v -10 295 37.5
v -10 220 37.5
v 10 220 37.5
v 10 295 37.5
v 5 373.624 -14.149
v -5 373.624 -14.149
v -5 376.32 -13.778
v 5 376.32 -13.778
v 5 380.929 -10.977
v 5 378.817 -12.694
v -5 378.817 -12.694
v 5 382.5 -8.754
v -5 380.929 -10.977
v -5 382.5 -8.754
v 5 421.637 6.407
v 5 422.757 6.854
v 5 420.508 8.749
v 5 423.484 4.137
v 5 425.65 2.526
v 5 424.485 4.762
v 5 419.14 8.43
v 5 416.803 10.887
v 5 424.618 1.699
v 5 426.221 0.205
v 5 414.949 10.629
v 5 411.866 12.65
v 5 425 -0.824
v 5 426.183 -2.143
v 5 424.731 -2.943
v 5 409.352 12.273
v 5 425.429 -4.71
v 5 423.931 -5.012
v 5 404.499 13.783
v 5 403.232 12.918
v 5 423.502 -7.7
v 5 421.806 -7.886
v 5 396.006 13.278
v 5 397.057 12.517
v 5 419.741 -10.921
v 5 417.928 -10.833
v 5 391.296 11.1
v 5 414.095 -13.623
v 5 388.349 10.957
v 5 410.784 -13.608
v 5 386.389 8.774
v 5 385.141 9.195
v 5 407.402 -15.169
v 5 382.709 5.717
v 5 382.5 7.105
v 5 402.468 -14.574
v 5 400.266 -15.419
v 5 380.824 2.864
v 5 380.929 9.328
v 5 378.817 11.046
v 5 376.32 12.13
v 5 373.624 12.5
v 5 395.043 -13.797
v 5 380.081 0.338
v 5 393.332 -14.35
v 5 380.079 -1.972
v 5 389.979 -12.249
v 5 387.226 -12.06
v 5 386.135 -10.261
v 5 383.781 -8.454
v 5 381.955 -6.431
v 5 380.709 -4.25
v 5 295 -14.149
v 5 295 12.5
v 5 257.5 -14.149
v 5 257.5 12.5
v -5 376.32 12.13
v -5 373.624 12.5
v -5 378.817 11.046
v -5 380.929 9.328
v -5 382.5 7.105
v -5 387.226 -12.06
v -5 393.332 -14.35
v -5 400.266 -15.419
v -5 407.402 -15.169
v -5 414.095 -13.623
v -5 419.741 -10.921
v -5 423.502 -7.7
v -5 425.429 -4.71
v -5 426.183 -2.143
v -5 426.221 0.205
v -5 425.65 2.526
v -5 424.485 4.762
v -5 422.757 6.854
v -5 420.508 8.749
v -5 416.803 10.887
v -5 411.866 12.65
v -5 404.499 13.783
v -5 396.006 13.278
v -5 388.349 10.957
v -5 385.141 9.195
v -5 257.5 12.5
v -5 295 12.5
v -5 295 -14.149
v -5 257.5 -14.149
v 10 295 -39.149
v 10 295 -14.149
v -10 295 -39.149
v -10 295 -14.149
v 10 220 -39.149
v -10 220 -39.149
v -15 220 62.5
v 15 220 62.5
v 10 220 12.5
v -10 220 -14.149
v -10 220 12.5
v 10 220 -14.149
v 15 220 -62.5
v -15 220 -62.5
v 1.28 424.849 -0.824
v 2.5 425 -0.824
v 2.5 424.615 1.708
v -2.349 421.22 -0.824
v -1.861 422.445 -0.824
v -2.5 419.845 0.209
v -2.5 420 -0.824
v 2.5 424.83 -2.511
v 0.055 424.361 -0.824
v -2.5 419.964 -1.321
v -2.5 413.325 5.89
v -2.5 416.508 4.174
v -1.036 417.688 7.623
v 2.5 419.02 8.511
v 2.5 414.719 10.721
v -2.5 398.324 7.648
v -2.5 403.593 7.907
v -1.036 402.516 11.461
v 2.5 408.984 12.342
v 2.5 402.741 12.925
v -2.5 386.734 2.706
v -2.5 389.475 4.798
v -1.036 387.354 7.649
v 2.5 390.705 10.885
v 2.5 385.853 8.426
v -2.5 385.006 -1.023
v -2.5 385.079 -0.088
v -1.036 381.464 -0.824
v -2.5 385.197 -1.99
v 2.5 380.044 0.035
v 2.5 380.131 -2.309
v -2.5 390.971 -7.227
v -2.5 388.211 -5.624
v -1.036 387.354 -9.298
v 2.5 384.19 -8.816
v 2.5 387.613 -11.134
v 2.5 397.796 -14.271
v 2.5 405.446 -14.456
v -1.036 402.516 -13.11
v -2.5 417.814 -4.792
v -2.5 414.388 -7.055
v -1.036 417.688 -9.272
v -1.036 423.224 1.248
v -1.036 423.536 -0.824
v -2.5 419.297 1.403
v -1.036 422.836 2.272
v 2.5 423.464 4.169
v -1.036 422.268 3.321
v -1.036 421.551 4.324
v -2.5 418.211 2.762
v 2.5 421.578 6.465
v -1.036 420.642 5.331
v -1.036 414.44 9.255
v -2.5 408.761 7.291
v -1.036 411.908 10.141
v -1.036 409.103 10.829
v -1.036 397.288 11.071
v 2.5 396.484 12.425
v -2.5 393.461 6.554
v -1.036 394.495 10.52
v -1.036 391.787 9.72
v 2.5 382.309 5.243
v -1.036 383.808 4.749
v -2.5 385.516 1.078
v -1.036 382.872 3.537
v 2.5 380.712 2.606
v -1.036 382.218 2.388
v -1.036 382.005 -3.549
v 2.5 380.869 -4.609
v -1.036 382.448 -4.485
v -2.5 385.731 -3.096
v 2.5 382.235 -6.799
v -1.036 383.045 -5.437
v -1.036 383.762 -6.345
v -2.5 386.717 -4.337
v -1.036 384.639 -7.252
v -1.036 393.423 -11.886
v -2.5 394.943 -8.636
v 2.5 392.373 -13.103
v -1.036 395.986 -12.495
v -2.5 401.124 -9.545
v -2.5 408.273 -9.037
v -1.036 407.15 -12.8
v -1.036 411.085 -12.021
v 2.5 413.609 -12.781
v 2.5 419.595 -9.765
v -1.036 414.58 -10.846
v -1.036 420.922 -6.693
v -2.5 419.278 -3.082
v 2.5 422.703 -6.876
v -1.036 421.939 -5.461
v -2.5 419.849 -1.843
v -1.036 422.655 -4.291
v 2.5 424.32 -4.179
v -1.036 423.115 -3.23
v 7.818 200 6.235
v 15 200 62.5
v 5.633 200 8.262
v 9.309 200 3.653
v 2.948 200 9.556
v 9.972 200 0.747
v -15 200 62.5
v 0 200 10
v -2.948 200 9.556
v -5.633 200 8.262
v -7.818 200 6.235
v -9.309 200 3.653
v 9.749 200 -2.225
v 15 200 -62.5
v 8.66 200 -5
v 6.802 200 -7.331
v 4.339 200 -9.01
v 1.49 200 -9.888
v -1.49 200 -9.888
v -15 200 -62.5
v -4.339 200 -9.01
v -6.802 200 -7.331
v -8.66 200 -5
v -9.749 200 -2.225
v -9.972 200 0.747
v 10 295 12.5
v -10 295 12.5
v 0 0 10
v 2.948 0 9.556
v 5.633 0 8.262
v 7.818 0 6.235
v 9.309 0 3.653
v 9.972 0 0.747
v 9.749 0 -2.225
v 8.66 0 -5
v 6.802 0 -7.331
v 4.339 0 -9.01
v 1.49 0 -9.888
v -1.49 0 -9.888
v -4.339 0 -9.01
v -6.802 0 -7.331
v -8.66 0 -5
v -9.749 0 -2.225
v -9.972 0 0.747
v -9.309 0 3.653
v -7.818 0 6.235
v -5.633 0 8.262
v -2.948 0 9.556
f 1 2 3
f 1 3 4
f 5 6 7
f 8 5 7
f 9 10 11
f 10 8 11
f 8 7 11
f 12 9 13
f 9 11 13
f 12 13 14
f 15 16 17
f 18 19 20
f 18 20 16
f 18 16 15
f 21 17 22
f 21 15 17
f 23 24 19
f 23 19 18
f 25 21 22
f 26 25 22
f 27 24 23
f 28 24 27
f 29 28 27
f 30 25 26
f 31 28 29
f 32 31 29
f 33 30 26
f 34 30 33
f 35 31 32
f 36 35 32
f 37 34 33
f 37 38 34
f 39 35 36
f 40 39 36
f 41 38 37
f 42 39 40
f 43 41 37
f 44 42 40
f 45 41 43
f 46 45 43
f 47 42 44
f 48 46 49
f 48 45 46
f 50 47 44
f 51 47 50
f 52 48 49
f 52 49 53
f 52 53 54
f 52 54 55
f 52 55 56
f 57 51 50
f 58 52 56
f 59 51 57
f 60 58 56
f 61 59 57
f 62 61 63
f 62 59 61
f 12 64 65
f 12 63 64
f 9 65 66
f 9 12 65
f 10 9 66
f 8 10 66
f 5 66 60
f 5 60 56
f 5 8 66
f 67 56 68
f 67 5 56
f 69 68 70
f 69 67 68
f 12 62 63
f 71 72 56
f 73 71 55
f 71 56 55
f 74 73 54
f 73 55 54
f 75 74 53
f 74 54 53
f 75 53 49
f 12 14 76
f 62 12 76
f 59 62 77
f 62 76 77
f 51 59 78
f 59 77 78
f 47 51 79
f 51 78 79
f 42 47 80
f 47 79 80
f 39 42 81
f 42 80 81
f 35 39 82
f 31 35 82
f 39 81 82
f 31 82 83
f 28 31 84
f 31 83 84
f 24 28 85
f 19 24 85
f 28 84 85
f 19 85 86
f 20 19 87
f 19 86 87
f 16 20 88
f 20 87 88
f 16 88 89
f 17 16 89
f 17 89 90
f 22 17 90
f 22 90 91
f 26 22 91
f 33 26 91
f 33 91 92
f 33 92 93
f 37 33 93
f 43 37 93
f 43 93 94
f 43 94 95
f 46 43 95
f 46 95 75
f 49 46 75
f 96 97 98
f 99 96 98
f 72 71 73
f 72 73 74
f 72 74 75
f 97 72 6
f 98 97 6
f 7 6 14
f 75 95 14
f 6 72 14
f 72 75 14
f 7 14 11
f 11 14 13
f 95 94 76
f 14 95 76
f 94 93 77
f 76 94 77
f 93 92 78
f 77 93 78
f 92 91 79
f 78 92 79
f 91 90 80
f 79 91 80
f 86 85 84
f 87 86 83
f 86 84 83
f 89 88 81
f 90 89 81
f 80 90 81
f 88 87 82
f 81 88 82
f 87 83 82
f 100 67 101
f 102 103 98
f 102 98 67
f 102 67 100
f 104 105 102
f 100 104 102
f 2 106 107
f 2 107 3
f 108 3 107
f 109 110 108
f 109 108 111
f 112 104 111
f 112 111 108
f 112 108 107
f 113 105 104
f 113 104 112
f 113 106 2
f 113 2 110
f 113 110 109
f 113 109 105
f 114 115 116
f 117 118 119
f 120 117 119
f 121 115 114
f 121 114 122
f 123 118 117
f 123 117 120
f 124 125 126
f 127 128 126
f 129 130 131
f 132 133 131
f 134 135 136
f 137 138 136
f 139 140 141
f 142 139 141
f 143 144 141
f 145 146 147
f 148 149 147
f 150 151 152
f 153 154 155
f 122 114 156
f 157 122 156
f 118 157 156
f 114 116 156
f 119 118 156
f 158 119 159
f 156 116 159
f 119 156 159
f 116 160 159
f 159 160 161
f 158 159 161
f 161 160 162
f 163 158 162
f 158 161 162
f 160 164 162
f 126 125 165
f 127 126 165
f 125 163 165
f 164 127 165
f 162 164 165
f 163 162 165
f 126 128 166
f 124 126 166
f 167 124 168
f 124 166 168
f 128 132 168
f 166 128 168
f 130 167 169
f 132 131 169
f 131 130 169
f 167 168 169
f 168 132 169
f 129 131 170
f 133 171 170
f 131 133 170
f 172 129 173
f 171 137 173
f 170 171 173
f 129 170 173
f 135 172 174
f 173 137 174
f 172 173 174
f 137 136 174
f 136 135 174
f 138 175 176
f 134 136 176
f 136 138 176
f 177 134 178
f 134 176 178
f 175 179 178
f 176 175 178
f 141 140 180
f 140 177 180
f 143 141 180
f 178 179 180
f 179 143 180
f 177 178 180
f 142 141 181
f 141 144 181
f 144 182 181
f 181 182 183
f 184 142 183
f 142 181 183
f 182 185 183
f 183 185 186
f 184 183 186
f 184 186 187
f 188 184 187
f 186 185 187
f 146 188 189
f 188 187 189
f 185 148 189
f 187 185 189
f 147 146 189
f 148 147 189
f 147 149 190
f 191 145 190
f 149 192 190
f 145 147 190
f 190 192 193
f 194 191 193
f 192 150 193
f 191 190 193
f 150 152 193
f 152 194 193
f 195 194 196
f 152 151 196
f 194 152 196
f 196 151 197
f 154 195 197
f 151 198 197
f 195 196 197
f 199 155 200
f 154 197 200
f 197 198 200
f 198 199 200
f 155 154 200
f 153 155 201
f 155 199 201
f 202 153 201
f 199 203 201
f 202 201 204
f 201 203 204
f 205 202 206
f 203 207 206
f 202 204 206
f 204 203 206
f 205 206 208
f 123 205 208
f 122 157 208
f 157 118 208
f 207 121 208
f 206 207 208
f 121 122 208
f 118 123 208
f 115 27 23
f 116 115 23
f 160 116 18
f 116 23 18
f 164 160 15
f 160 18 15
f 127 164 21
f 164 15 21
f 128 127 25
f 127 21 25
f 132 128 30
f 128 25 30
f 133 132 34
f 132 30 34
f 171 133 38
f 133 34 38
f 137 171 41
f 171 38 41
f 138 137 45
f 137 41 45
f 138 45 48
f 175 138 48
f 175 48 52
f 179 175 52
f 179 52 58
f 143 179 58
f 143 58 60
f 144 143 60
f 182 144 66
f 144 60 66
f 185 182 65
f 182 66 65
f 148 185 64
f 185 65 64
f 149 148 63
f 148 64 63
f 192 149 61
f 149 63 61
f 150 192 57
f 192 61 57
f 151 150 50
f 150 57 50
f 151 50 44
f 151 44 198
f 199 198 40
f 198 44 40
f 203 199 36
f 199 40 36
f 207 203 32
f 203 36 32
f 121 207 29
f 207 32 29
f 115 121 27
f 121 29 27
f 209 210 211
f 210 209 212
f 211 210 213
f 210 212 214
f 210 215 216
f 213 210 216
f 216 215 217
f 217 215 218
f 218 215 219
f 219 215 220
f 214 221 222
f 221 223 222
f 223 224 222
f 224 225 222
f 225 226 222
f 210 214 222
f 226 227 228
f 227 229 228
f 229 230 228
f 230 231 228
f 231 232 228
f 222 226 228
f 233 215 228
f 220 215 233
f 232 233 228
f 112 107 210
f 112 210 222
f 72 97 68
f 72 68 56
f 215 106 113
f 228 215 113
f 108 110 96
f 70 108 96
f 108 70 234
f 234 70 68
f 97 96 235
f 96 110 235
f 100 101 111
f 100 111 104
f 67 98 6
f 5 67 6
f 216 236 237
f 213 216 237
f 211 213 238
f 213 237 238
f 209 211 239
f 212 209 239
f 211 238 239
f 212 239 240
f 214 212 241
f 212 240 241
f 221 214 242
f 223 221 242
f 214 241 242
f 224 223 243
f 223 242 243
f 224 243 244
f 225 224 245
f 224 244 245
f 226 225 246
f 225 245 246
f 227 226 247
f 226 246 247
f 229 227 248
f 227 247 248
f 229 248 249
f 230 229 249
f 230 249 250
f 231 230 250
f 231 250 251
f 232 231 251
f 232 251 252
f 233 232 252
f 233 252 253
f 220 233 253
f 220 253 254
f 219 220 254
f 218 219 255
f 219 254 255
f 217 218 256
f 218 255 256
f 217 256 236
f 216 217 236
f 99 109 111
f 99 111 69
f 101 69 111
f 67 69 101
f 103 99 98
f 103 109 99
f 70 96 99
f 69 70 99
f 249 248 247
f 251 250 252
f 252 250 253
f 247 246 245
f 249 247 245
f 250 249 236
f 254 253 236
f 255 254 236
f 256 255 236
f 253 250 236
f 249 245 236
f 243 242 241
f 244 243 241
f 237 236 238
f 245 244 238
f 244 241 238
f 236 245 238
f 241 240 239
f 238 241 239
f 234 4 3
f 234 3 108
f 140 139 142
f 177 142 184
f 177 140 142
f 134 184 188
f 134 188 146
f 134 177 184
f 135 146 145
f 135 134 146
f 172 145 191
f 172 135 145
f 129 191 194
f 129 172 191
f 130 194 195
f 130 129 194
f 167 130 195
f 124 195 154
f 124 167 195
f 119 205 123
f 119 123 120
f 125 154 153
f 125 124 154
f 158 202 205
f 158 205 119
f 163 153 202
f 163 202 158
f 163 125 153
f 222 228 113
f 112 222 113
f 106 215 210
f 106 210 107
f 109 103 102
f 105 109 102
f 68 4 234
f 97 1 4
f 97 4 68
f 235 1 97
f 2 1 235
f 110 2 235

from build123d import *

# Parameters (mm, degrees)
SKETCH1_R                = 10
BOSS_EXTRUDE1_DEPTH      = 200
BOSS_EXTRUDE2_DEPTH      = 15
BOSS_EXTRUDE2_DEPTH_BACK = 15
SKETCH2_W                = 125
SKETCH2_H                = 20
BOSS_EXTRUDE3_DEPTH      = 10
BOSS_EXTRUDE3_DEPTH_BACK = 10
SKETCH3_W                = 25
SKETCH3_H                = 75
BOSS_EXTRUDE4_DEPTH      = 5
BOSS_EXTRUDE4_DEPTH_BACK = 5
SKETCH5_W                = 26.648824617
SKETCH5_H                = 125
BOSS_EXTRUDE5_DEPTH      = 5
BOSS_EXTRUDE5_DEPTH_BACK = 5
SKETCH6_RX               = 23.77956847
SKETCH6_RY               = 14.659300575
FILLET1_R                = 10
FILLET2_R                = 10
SKETCH7_RX               = 22.5
SKETCH7_RY               = 13.75
CUT_EXTRUDE1_DEPTH       = 7.5
FILLET3_R                = 5


with BuildPart() as part:
    # Sketch1 → Boss-Extrude1 (new body)
    with BuildSketch(Plane(origin=(0, 0, 0), x_dir=(1, 0, 0), z_dir=(0, 1, 0))):
        with Locations(Location((0, 0, 0), (0, 0, 270))):
            Circle(SKETCH1_R)
    extrude(amount=BOSS_EXTRUDE1_DEPTH)

    # Sketch2 → Boss-Extrude2 (add, two sides: drawn at the far end of the back side and taken through both)
    with BuildSketch(Plane(origin=(0, 0, 0), x_dir=(0, 0, -1), z_dir=(1, 0, 0)).offset(-BOSS_EXTRUDE2_DEPTH_BACK)):
        with Locations((0, 210)):
            Rectangle(SKETCH2_W, SKETCH2_H)
    extrude(amount=BOSS_EXTRUDE2_DEPTH + BOSS_EXTRUDE2_DEPTH_BACK)

    # Sketch3 → Boss-Extrude3 (add, two sides: drawn at the far end of the back side and taken through both)
    with BuildSketch(Plane(origin=(0, 0, 0), x_dir=(0, 0, -1), z_dir=(1, 0, 0)).offset(-BOSS_EXTRUDE3_DEPTH_BACK)):
        with Locations((-25, 257.5)):
            Rectangle(SKETCH3_W, SKETCH3_H)
        with Locations((26.648824617, 257.5)):
            Rectangle(SKETCH3_W, SKETCH3_H)
    extrude(amount=BOSS_EXTRUDE3_DEPTH + BOSS_EXTRUDE3_DEPTH_BACK)

    # Sketch5 → Boss-Extrude4 (add, two sides: drawn at the far end of the back side and taken through both)
    with BuildSketch(Plane(origin=(0, 0, 0), x_dir=(0, 0, -1), z_dir=(1, 0, 0)).offset(-BOSS_EXTRUDE4_DEPTH_BACK)):
        with Locations((0.824412309, 320)):
            Rectangle(SKETCH5_W, SKETCH5_H)
    extrude(amount=BOSS_EXTRUDE4_DEPTH + BOSS_EXTRUDE4_DEPTH_BACK)

    # Sketch6 → Boss-Extrude5 (add, two sides: drawn at the far end of the back side and taken through both)
    with BuildSketch(Plane(origin=(0, 0, 0), x_dir=(0, 0, -1), z_dir=(1, 0, 0)).offset(-BOSS_EXTRUDE5_DEPTH_BACK)):
        with Locations(Location((0.824412308, 402.5), (0, 0, -90))):
            Ellipse(SKETCH6_RX, SKETCH6_RY)
    extrude(amount=BOSS_EXTRUDE5_DEPTH + BOSS_EXTRUDE5_DEPTH_BACK)

    # Fillet1
    # the kernel refuses this fillet: 10 mm, written as the material it takes off along each edge
    with BuildSketch(Plane(origin=(-27.190897542, 382.5, -14.148824617), x_dir=(0, 0, 1), z_dir=(1, 0, 0))) as fillet1_piece_1:
        with BuildLine():
            CenterArc((10, 8.876359017), FILLET1_R, 180, 62.577662354)
            Line((0, 8.876359017), (0, 0))
            Line((0, 0), (5.394541216, 0))
        make_face()
    extrude(amount=27.190898125, mode=Mode.SUBTRACT)
    with BuildSketch(Plane(origin=(5.84e-07, 382.5, -14.148824617), x_dir=(0, 0, 1), z_dir=(1, 0, 0))) as fillet1_piece_2:
        with BuildLine():
            CenterArc((10, 8.876359017), FILLET1_R, 180, 62.577662354)
            Line((0, 8.876359017), (0, 0))
            Line((0, 0), (5.394541216, 0))
        make_face()
    extrude(amount=27.190896958, mode=Mode.SUBTRACT)

    # Fillet2
    # the kernel refuses this fillet: 10 mm, written as the material it takes off along each edge
    with BuildSketch(Plane(origin=(27.190897542, 382.5, 12.5), x_dir=(0, 0, -1), z_dir=(-1, 0, 0))) as fillet2_piece_1:
        with BuildLine():
            CenterArc((10, 8.876359017), FILLET2_R, 180, 62.577662355)
            Line((0, 8.876359017), (0, 0))
            Line((0, 0), (5.394541216, 0))
        make_face()
    extrude(amount=27.190896946, mode=Mode.SUBTRACT)
    with BuildSketch(Plane(origin=(5.96e-07, 382.5, 12.5), x_dir=(0, 0, -1), z_dir=(-1, 0, 0))) as fillet2_piece_2:
        with BuildLine():
            CenterArc((10, 8.876359017), FILLET2_R, 180, 62.577662354)
            Line((0, 8.876359017), (0, 0))
            Line((0, 0), (5.394541216, 0))
        make_face()
    extrude(amount=27.190898138, mode=Mode.SUBTRACT)

    # Sketch7 → Cut-Extrude1 (cut)
    with BuildSketch(Plane(origin=(5, 0, 0), x_dir=(0, 0, -1), z_dir=(1, 0, 0))):
        with Locations(Location((0.824412308, 402.5), (0, 0, 90))):
            Ellipse(SKETCH7_RX, SKETCH7_RY)
    extrude(amount=-CUT_EXTRUDE1_DEPTH, mode=Mode.SUBTRACT)

    # Fillet3
    fillet3_edges = [part.edges().sort_by_distance(p)[0] for p in [
        (-2.5, 380.000046084, -0.852241692),
    ]]
    fillet(fillet3_edges, radius=FILLET3_R)


solid = part.part
